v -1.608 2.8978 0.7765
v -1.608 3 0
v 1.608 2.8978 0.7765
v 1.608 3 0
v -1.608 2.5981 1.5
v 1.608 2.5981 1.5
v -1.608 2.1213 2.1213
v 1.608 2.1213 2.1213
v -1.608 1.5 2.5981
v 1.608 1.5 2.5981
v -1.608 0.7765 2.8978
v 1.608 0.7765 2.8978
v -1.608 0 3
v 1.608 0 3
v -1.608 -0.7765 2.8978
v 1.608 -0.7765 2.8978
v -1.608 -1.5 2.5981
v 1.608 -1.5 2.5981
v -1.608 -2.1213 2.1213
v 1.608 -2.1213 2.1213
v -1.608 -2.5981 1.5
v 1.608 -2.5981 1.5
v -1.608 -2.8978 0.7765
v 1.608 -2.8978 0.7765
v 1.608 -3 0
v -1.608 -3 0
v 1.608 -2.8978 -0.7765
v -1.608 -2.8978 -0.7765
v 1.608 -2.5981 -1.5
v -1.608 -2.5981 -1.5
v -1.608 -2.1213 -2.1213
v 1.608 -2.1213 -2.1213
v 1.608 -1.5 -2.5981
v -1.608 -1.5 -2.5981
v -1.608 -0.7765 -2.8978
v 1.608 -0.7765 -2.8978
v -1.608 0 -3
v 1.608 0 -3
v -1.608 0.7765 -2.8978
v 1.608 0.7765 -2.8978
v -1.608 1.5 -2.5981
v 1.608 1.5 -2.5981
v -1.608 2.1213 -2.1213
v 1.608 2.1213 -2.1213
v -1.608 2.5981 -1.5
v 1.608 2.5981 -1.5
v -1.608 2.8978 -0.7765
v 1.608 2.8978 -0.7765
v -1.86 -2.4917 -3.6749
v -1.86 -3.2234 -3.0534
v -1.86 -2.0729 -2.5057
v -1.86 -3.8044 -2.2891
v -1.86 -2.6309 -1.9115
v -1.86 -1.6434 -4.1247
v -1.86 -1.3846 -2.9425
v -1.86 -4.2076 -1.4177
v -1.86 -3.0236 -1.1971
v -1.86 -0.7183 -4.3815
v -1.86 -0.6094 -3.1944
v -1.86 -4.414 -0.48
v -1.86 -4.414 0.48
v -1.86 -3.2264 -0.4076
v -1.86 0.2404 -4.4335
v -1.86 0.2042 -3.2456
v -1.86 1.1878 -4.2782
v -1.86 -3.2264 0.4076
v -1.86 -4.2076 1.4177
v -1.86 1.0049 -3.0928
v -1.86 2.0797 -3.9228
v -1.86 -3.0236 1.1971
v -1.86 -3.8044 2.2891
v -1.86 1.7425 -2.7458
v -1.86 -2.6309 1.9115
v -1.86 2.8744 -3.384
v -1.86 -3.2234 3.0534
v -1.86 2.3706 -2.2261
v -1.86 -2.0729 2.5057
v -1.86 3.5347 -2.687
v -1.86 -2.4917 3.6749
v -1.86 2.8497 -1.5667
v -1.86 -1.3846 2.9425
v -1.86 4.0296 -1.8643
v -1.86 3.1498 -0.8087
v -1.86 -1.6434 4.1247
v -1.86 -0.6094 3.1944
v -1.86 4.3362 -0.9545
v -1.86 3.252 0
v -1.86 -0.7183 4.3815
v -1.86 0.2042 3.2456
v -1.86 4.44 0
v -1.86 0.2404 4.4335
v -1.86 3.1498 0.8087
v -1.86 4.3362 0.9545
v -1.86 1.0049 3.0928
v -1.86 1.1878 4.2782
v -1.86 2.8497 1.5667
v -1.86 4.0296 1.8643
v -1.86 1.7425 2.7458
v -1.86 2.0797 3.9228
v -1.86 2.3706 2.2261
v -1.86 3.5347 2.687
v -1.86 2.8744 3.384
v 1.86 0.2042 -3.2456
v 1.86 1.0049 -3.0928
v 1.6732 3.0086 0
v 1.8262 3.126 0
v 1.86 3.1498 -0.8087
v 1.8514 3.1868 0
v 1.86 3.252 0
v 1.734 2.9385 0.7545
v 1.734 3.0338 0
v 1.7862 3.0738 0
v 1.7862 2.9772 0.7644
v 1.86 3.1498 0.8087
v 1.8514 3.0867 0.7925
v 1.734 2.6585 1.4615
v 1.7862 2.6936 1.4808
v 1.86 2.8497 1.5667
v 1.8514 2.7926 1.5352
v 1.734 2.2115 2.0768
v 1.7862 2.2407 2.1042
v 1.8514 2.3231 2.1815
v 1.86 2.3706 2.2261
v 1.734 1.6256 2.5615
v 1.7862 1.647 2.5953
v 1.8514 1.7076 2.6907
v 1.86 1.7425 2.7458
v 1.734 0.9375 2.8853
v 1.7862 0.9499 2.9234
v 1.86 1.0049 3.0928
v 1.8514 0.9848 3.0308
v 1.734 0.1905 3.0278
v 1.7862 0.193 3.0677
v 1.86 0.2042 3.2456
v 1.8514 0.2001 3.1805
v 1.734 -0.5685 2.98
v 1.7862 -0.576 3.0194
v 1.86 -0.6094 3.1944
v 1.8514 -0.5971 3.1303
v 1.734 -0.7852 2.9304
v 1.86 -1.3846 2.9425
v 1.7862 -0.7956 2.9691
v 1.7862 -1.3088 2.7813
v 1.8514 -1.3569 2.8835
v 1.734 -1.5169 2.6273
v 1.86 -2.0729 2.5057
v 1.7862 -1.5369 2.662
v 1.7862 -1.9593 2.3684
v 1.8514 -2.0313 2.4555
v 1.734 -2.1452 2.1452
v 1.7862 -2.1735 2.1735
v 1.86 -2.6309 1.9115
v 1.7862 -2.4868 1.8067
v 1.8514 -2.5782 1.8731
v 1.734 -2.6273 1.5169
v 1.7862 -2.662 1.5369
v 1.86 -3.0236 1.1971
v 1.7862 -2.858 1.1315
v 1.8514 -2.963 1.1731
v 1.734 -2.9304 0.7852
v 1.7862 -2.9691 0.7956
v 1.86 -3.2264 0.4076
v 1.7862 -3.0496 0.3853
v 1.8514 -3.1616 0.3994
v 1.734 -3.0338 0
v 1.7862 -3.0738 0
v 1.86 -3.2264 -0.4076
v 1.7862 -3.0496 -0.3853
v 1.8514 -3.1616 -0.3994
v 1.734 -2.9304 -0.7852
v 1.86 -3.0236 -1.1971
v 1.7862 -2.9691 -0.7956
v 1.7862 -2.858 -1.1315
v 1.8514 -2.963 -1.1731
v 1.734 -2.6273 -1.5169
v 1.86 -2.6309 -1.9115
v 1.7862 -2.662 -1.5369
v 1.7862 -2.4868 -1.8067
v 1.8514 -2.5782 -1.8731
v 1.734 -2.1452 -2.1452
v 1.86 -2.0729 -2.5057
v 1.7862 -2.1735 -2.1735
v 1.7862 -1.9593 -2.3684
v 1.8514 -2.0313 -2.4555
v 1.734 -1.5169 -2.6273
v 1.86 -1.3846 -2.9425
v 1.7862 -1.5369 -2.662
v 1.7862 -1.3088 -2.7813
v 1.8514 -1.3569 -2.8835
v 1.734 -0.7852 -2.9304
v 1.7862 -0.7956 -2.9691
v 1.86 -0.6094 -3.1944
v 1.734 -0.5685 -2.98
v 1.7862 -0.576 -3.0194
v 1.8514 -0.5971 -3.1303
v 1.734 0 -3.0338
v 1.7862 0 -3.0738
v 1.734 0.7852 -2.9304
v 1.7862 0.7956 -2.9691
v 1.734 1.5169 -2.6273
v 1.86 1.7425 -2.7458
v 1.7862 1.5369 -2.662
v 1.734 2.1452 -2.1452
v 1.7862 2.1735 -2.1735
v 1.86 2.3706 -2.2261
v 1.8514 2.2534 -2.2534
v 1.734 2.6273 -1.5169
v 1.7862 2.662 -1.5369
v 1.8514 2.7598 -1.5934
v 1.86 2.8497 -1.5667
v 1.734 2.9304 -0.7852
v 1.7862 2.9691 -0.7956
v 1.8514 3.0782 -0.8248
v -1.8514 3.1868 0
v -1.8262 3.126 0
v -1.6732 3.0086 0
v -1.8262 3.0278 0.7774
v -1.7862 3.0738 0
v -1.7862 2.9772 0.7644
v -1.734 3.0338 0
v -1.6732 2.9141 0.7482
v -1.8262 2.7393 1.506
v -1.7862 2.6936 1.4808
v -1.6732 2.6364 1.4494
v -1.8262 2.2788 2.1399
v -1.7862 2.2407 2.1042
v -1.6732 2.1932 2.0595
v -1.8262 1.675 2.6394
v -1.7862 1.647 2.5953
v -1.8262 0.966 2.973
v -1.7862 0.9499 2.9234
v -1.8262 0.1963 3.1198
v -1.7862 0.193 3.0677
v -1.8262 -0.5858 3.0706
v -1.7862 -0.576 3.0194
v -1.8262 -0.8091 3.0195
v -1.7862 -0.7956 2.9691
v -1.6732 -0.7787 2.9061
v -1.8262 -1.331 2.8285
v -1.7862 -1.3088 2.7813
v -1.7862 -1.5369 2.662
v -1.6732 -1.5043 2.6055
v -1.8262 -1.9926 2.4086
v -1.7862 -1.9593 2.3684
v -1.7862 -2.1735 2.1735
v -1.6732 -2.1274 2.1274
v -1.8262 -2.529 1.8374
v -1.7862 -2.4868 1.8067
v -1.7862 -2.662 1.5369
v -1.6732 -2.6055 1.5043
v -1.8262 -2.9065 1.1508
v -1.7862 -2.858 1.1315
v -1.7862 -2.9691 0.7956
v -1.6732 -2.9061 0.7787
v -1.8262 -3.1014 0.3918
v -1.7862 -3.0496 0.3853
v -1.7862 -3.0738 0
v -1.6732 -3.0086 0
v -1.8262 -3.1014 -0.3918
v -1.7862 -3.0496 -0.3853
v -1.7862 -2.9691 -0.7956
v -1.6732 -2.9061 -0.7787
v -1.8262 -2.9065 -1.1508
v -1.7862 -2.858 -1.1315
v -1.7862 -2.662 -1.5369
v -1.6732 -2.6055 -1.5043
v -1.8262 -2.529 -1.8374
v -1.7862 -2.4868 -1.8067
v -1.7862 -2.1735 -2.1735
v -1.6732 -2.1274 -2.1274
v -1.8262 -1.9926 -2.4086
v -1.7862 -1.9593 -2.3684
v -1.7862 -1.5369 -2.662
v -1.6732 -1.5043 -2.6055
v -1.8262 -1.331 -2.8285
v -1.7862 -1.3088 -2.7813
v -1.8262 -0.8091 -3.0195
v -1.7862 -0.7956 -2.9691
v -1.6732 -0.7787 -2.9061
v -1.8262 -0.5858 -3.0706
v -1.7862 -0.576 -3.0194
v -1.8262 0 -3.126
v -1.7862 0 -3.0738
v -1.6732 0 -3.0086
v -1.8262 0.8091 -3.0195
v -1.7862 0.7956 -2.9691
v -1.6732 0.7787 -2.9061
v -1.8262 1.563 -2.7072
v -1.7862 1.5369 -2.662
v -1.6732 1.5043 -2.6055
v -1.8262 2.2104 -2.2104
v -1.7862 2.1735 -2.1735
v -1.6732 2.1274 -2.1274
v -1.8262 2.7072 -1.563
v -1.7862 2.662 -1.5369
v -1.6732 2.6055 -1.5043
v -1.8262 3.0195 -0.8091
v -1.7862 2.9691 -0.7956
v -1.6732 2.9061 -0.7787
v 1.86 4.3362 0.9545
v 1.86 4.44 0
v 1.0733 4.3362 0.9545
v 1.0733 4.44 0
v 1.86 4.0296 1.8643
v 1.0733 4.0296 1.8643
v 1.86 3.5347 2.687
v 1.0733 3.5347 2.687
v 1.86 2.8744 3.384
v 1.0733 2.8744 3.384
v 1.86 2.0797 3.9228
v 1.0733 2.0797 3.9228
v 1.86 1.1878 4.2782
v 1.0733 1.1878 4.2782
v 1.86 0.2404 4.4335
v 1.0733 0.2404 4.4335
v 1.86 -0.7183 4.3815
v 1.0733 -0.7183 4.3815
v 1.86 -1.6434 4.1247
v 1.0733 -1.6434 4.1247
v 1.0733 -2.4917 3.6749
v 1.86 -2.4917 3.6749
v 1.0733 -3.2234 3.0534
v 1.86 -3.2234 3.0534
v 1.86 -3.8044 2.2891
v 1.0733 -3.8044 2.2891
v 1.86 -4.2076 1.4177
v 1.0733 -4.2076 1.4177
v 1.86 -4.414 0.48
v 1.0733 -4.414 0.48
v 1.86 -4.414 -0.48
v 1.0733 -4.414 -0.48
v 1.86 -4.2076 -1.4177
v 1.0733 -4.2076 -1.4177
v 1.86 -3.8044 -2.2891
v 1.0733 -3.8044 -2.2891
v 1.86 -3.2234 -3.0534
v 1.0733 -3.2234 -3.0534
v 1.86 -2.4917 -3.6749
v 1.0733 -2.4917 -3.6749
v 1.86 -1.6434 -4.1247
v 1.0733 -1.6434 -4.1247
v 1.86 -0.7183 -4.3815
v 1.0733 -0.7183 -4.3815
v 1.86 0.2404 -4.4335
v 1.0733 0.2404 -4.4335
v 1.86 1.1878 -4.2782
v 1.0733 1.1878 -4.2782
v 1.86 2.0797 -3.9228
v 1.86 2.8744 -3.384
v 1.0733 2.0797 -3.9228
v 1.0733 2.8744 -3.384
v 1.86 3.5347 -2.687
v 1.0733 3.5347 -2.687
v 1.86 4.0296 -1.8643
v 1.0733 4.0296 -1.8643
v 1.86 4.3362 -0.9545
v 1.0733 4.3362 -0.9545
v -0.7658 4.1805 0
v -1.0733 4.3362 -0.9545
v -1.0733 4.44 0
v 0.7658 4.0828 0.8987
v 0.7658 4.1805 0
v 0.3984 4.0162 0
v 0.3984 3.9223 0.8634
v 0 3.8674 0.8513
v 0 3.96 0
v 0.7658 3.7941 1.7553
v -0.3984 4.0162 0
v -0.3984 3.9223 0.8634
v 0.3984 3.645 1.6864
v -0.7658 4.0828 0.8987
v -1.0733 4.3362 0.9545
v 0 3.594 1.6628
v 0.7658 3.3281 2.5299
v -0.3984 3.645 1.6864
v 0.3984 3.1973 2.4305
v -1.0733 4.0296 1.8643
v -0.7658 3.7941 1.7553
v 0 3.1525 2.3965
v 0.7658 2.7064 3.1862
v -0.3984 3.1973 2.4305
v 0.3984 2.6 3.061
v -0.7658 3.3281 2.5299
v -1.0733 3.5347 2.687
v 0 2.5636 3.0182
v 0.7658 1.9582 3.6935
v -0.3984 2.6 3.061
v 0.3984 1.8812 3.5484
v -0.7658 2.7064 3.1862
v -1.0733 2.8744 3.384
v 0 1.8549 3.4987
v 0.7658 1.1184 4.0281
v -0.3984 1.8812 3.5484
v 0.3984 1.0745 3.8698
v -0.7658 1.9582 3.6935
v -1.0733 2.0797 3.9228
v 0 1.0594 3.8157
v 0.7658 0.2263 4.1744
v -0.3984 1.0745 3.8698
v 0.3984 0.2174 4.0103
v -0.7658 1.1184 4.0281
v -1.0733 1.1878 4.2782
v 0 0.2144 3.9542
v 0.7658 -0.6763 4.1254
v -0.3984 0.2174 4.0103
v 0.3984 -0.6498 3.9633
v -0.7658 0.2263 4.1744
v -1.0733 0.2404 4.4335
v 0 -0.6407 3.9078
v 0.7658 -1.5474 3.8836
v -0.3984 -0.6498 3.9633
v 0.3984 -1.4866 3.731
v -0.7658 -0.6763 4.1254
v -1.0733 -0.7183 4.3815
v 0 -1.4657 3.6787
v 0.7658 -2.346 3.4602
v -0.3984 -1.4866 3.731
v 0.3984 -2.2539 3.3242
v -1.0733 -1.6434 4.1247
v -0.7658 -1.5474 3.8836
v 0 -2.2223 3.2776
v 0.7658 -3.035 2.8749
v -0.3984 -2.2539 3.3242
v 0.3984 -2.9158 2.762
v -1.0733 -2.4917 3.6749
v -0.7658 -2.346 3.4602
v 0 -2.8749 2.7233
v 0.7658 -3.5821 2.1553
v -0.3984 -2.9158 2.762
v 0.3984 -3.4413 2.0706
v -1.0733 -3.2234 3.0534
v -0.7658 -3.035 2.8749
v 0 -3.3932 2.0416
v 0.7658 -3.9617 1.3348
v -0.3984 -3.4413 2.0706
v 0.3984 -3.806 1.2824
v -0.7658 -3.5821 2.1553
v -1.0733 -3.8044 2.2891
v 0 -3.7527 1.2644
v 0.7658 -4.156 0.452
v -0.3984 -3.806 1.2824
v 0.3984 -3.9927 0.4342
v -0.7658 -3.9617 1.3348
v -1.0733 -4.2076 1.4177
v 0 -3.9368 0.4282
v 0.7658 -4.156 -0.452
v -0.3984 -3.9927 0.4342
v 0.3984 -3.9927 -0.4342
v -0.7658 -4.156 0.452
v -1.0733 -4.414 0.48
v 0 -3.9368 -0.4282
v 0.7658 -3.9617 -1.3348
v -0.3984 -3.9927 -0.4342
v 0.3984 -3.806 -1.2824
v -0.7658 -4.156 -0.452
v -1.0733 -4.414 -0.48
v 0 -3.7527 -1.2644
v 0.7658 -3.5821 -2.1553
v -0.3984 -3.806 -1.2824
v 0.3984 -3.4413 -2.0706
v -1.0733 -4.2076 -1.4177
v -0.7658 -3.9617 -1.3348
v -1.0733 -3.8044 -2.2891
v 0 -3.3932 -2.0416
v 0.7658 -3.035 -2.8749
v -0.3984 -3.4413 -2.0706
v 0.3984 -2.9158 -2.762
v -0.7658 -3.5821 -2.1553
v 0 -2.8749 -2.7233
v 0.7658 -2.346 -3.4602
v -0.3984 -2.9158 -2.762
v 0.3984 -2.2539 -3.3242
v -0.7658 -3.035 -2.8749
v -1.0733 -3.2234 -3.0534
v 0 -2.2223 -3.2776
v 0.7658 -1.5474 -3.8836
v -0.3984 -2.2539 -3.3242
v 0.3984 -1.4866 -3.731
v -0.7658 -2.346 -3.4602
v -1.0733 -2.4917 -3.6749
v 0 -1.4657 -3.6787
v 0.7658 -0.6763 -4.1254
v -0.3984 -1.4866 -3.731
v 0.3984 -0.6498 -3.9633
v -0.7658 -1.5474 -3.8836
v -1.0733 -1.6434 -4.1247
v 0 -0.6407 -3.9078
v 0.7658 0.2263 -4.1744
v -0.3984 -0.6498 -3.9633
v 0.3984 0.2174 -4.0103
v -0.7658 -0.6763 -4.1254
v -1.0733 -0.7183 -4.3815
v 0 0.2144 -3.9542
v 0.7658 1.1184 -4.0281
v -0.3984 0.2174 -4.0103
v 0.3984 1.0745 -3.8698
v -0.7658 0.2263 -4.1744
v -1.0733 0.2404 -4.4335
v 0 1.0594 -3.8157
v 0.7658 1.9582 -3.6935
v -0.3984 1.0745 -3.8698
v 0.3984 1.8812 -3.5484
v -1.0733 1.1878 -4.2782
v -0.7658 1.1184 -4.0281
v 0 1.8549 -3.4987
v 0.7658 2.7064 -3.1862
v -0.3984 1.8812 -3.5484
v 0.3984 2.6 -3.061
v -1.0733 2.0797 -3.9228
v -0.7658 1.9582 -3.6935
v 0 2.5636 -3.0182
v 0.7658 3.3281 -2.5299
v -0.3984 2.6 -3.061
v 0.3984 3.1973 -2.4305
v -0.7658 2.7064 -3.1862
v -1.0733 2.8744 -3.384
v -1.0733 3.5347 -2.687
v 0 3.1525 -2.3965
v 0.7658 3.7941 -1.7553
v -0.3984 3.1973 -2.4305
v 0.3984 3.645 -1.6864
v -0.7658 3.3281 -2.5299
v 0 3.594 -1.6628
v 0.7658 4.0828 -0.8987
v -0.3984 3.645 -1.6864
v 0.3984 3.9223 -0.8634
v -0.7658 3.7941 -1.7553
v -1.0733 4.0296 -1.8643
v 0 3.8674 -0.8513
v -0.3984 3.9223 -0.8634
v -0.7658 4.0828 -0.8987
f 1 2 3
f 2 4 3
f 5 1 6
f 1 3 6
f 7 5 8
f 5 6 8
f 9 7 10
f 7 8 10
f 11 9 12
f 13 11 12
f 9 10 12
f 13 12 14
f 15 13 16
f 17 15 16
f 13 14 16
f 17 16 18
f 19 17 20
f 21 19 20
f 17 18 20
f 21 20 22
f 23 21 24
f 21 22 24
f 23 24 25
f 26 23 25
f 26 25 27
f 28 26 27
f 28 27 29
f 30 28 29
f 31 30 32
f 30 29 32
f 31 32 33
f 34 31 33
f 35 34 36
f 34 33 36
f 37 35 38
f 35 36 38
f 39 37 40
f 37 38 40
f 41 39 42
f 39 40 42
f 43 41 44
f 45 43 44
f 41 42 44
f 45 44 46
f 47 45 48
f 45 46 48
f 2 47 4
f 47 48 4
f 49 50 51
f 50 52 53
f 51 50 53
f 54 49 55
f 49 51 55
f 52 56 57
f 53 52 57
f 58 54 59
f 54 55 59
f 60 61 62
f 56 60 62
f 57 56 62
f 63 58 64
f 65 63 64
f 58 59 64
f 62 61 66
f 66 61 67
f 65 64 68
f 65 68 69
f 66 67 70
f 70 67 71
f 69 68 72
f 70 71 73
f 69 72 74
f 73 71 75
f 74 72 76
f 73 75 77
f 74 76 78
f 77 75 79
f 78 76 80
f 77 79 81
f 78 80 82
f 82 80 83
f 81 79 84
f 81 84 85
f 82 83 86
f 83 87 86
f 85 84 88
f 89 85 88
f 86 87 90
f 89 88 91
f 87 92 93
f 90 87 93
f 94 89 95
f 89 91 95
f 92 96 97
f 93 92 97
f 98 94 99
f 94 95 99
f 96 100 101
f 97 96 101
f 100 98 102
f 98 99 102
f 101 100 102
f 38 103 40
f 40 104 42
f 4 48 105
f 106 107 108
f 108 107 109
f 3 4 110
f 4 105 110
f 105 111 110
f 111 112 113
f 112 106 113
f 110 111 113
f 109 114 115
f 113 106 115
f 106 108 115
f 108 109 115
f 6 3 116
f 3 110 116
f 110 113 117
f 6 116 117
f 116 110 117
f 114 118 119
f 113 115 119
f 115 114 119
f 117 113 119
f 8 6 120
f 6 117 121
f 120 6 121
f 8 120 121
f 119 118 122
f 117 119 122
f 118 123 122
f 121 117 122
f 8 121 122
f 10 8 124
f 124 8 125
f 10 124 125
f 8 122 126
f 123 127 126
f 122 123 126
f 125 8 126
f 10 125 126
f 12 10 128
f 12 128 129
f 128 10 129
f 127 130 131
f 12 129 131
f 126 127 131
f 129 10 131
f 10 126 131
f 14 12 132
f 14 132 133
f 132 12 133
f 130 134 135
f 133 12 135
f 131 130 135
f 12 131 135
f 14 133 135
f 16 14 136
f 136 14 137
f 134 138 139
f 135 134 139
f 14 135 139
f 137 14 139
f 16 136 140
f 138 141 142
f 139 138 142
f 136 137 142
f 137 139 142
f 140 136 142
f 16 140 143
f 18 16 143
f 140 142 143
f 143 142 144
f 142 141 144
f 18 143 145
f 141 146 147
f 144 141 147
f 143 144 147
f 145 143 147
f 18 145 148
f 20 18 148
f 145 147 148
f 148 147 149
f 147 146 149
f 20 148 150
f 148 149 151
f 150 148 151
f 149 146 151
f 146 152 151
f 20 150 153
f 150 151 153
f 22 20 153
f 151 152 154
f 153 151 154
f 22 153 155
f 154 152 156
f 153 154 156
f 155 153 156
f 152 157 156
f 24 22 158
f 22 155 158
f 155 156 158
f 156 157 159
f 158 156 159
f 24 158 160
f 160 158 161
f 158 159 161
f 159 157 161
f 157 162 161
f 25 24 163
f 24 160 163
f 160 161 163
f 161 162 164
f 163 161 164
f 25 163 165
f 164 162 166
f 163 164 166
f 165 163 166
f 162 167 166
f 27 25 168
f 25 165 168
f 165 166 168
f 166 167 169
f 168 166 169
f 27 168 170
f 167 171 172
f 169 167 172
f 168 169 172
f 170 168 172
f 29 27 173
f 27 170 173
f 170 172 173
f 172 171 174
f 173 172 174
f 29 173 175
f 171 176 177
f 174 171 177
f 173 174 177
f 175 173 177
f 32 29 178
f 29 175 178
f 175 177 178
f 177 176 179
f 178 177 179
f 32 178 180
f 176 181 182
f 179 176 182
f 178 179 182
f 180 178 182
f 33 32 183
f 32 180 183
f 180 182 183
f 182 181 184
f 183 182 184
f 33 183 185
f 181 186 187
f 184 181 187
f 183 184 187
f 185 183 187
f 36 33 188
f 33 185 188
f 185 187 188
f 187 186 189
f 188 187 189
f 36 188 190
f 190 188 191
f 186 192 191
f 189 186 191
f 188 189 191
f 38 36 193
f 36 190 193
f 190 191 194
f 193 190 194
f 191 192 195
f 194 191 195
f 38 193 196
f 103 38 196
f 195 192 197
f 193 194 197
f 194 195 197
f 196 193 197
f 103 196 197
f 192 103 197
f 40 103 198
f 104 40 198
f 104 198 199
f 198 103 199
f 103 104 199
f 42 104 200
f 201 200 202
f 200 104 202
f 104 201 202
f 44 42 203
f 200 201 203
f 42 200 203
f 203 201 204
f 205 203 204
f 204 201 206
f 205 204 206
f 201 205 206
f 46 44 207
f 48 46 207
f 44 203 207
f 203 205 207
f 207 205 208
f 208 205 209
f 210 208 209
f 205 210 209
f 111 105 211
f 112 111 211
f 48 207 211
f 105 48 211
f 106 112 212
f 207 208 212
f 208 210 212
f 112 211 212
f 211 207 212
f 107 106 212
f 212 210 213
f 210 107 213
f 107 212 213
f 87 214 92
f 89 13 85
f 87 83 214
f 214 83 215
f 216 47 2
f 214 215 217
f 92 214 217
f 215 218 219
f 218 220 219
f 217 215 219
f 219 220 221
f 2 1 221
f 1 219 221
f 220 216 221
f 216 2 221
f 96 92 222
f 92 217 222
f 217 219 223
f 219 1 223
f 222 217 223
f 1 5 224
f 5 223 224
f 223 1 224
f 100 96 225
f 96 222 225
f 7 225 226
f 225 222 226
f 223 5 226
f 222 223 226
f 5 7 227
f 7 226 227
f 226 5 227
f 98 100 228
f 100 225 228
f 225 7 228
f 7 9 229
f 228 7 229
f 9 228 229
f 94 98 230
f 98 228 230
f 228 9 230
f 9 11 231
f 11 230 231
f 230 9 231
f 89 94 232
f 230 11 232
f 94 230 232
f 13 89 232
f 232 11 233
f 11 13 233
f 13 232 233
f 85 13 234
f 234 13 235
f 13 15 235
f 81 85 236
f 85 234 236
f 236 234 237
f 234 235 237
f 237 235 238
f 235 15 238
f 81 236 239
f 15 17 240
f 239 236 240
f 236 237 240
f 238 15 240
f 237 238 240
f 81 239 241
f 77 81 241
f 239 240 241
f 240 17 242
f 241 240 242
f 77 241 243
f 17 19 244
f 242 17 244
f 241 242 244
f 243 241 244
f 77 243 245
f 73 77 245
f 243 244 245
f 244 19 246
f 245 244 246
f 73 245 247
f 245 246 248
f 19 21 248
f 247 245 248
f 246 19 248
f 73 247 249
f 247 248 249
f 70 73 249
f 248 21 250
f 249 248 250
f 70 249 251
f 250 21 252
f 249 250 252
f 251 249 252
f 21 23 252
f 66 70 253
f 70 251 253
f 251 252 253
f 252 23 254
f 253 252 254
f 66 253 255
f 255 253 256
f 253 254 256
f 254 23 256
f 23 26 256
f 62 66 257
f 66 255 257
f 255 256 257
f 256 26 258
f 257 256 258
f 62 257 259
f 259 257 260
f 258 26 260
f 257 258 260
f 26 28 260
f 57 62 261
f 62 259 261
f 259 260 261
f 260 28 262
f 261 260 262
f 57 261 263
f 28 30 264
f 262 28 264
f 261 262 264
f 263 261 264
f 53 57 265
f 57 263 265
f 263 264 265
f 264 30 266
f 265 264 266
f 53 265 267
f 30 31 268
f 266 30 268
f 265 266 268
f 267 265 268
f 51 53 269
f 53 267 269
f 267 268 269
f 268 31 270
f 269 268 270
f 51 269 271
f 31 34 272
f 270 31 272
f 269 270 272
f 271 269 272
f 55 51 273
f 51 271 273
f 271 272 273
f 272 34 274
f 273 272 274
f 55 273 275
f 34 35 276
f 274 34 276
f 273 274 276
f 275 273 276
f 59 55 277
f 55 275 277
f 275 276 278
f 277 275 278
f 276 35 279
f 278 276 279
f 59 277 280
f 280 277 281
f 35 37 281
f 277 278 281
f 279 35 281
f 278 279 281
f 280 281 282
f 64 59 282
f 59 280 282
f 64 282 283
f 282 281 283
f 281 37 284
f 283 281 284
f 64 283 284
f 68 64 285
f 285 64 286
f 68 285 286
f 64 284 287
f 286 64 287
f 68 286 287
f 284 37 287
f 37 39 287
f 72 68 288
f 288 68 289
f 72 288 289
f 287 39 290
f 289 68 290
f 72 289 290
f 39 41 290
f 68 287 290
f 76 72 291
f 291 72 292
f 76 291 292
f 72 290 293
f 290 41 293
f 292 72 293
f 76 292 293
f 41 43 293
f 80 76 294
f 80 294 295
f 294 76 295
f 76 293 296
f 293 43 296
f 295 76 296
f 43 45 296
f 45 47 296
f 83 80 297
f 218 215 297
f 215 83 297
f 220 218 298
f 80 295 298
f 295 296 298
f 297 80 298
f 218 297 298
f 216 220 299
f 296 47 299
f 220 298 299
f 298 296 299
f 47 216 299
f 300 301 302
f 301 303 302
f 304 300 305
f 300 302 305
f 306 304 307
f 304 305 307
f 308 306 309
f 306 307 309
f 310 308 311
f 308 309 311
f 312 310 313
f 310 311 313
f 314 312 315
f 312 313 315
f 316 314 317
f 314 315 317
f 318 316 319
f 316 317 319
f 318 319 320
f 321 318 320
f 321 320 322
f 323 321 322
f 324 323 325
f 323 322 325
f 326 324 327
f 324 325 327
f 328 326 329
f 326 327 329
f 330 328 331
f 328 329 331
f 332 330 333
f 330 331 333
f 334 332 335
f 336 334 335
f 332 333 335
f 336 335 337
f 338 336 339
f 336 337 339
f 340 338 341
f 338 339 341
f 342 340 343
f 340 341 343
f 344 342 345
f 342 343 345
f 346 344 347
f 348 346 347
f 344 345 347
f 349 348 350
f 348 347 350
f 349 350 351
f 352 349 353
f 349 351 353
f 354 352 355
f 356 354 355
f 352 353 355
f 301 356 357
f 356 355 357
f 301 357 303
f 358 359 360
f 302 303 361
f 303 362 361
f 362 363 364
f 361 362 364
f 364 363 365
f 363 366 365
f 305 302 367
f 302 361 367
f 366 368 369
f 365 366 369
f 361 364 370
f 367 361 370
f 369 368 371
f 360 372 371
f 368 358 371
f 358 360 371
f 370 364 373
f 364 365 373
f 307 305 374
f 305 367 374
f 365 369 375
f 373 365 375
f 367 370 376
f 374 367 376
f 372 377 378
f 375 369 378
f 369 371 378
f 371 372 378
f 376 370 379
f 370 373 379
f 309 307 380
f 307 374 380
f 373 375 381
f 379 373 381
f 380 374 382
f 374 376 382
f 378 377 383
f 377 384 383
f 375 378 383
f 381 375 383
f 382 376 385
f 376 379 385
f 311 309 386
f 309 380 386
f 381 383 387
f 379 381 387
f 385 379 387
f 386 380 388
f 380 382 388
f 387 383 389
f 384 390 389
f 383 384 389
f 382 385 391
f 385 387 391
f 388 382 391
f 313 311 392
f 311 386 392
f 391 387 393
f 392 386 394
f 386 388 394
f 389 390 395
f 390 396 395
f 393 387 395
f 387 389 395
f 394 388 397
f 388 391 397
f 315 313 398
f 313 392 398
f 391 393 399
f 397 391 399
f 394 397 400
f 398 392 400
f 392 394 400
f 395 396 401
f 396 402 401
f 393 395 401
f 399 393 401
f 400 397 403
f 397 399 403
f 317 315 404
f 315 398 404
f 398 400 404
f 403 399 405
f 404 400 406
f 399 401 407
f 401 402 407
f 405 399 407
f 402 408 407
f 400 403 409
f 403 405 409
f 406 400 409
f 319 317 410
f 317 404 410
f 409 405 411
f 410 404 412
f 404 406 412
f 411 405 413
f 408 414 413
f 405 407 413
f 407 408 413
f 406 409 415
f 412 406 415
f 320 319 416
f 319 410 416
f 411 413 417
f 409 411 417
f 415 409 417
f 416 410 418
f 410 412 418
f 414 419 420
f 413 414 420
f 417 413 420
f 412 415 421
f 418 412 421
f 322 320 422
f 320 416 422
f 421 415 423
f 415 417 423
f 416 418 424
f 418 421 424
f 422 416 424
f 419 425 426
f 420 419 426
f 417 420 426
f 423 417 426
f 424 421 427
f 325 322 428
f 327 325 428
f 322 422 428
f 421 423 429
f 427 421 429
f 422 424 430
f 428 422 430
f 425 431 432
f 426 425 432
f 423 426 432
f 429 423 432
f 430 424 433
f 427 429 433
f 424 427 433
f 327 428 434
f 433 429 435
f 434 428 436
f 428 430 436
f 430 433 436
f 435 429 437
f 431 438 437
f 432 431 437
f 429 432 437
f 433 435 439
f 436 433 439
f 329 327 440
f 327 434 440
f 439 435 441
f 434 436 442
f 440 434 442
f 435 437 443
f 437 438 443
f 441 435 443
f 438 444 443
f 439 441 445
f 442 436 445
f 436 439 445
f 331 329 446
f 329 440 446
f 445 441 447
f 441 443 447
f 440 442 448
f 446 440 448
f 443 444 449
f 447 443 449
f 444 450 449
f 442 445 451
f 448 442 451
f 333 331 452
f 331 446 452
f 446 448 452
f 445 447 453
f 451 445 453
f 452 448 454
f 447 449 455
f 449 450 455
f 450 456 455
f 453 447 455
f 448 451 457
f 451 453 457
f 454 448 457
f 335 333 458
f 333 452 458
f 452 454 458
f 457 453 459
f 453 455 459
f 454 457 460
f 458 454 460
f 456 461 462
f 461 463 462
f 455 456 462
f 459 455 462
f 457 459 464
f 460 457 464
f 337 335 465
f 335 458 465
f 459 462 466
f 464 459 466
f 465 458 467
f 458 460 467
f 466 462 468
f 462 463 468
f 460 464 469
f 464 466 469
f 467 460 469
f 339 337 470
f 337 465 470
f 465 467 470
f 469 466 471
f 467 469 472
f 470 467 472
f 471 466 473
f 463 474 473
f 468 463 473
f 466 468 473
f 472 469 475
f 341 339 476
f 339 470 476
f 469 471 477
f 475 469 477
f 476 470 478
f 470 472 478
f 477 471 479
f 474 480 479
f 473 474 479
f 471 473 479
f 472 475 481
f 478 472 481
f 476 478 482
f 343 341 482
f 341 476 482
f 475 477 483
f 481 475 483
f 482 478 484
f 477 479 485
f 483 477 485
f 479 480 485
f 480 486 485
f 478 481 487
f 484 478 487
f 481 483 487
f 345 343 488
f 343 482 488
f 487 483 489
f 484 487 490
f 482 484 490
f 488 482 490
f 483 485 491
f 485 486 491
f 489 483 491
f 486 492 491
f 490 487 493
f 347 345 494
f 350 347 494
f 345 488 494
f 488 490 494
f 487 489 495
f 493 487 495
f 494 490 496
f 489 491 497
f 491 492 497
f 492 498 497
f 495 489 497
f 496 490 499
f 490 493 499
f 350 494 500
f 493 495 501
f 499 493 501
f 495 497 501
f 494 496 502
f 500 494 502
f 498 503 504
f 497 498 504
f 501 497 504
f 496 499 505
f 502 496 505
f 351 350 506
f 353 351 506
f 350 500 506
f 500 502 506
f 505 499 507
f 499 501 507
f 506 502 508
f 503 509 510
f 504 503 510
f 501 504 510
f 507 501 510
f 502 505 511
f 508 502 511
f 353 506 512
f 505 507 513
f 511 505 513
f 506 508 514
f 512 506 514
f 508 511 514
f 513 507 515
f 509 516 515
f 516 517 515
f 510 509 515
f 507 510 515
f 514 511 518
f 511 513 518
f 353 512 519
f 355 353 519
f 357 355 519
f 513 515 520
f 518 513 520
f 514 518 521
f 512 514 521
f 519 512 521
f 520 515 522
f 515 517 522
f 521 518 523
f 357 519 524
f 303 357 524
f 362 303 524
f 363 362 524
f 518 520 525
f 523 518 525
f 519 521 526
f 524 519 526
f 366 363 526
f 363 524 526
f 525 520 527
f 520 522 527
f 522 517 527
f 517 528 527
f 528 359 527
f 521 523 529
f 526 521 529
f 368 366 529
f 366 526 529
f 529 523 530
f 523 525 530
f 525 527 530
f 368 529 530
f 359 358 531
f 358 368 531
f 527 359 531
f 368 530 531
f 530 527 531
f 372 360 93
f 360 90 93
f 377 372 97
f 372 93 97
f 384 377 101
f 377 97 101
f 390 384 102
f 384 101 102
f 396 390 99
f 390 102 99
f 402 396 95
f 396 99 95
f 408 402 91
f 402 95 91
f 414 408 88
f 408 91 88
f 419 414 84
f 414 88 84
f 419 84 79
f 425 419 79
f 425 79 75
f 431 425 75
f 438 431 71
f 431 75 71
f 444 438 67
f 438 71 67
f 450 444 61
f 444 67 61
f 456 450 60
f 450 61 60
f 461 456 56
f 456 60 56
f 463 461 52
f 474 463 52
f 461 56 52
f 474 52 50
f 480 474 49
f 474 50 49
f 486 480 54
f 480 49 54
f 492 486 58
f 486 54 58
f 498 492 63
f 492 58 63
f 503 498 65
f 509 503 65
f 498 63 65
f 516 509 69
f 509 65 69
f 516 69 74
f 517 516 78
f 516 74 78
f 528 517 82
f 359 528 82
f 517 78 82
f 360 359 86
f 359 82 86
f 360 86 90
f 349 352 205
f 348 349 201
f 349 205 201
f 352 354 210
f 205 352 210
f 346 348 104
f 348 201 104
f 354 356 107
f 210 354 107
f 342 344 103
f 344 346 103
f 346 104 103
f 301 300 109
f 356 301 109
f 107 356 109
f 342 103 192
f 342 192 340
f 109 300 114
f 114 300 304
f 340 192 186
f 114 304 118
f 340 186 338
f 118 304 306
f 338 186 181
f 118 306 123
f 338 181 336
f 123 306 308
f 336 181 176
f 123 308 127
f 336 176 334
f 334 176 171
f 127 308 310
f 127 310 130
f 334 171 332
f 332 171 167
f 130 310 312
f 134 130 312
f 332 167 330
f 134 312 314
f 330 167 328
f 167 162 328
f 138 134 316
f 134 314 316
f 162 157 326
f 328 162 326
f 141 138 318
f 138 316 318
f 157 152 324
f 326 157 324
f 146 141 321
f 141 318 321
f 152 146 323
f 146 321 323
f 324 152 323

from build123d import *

# Parameters (mm, degrees)
SCALE1_SCALE = 1.2
SCALE2_SCALE = 0.1


with BuildPart() as part:
    # Sketch1 → Revolve1 (revolve)
    with BuildSketch(Plane.XY):
        with BuildLine():
            Line((-13.4, 25), (13.4, 25))
            ThreePointArc((13.4, 25), (14.88492424, 25.61507576), (15.5, 27.1))
            Line((15.5, 27.1), (15.5, 37))
            Line((15.5, 37), (8.94427191, 37))
            ThreePointArc((8.94427191, 37), (0, 33), (-8.94427191, 37))
            Line((-8.94427191, 37), (-15.5, 37))
            Line((-15.5, 37), (-15.5, 27.1))
            ThreePointArc((-15.5, 27.1), (-14.88492424, 25.61507576), (-13.4, 25))
        make_face()
    revolve(axis=Axis((-24.473684211, 0, 0), (1, 0, 0)))


with BuildPart() as part_1:
    # Scale1: scaled about (0, 0, 0)
    add(part.part.scale(SCALE1_SCALE))


with BuildPart() as part_2:
    # Scale2: scaled about (0, 0, 0)
    add(part_1.part.scale(SCALE2_SCALE))


solid = part_2.part
